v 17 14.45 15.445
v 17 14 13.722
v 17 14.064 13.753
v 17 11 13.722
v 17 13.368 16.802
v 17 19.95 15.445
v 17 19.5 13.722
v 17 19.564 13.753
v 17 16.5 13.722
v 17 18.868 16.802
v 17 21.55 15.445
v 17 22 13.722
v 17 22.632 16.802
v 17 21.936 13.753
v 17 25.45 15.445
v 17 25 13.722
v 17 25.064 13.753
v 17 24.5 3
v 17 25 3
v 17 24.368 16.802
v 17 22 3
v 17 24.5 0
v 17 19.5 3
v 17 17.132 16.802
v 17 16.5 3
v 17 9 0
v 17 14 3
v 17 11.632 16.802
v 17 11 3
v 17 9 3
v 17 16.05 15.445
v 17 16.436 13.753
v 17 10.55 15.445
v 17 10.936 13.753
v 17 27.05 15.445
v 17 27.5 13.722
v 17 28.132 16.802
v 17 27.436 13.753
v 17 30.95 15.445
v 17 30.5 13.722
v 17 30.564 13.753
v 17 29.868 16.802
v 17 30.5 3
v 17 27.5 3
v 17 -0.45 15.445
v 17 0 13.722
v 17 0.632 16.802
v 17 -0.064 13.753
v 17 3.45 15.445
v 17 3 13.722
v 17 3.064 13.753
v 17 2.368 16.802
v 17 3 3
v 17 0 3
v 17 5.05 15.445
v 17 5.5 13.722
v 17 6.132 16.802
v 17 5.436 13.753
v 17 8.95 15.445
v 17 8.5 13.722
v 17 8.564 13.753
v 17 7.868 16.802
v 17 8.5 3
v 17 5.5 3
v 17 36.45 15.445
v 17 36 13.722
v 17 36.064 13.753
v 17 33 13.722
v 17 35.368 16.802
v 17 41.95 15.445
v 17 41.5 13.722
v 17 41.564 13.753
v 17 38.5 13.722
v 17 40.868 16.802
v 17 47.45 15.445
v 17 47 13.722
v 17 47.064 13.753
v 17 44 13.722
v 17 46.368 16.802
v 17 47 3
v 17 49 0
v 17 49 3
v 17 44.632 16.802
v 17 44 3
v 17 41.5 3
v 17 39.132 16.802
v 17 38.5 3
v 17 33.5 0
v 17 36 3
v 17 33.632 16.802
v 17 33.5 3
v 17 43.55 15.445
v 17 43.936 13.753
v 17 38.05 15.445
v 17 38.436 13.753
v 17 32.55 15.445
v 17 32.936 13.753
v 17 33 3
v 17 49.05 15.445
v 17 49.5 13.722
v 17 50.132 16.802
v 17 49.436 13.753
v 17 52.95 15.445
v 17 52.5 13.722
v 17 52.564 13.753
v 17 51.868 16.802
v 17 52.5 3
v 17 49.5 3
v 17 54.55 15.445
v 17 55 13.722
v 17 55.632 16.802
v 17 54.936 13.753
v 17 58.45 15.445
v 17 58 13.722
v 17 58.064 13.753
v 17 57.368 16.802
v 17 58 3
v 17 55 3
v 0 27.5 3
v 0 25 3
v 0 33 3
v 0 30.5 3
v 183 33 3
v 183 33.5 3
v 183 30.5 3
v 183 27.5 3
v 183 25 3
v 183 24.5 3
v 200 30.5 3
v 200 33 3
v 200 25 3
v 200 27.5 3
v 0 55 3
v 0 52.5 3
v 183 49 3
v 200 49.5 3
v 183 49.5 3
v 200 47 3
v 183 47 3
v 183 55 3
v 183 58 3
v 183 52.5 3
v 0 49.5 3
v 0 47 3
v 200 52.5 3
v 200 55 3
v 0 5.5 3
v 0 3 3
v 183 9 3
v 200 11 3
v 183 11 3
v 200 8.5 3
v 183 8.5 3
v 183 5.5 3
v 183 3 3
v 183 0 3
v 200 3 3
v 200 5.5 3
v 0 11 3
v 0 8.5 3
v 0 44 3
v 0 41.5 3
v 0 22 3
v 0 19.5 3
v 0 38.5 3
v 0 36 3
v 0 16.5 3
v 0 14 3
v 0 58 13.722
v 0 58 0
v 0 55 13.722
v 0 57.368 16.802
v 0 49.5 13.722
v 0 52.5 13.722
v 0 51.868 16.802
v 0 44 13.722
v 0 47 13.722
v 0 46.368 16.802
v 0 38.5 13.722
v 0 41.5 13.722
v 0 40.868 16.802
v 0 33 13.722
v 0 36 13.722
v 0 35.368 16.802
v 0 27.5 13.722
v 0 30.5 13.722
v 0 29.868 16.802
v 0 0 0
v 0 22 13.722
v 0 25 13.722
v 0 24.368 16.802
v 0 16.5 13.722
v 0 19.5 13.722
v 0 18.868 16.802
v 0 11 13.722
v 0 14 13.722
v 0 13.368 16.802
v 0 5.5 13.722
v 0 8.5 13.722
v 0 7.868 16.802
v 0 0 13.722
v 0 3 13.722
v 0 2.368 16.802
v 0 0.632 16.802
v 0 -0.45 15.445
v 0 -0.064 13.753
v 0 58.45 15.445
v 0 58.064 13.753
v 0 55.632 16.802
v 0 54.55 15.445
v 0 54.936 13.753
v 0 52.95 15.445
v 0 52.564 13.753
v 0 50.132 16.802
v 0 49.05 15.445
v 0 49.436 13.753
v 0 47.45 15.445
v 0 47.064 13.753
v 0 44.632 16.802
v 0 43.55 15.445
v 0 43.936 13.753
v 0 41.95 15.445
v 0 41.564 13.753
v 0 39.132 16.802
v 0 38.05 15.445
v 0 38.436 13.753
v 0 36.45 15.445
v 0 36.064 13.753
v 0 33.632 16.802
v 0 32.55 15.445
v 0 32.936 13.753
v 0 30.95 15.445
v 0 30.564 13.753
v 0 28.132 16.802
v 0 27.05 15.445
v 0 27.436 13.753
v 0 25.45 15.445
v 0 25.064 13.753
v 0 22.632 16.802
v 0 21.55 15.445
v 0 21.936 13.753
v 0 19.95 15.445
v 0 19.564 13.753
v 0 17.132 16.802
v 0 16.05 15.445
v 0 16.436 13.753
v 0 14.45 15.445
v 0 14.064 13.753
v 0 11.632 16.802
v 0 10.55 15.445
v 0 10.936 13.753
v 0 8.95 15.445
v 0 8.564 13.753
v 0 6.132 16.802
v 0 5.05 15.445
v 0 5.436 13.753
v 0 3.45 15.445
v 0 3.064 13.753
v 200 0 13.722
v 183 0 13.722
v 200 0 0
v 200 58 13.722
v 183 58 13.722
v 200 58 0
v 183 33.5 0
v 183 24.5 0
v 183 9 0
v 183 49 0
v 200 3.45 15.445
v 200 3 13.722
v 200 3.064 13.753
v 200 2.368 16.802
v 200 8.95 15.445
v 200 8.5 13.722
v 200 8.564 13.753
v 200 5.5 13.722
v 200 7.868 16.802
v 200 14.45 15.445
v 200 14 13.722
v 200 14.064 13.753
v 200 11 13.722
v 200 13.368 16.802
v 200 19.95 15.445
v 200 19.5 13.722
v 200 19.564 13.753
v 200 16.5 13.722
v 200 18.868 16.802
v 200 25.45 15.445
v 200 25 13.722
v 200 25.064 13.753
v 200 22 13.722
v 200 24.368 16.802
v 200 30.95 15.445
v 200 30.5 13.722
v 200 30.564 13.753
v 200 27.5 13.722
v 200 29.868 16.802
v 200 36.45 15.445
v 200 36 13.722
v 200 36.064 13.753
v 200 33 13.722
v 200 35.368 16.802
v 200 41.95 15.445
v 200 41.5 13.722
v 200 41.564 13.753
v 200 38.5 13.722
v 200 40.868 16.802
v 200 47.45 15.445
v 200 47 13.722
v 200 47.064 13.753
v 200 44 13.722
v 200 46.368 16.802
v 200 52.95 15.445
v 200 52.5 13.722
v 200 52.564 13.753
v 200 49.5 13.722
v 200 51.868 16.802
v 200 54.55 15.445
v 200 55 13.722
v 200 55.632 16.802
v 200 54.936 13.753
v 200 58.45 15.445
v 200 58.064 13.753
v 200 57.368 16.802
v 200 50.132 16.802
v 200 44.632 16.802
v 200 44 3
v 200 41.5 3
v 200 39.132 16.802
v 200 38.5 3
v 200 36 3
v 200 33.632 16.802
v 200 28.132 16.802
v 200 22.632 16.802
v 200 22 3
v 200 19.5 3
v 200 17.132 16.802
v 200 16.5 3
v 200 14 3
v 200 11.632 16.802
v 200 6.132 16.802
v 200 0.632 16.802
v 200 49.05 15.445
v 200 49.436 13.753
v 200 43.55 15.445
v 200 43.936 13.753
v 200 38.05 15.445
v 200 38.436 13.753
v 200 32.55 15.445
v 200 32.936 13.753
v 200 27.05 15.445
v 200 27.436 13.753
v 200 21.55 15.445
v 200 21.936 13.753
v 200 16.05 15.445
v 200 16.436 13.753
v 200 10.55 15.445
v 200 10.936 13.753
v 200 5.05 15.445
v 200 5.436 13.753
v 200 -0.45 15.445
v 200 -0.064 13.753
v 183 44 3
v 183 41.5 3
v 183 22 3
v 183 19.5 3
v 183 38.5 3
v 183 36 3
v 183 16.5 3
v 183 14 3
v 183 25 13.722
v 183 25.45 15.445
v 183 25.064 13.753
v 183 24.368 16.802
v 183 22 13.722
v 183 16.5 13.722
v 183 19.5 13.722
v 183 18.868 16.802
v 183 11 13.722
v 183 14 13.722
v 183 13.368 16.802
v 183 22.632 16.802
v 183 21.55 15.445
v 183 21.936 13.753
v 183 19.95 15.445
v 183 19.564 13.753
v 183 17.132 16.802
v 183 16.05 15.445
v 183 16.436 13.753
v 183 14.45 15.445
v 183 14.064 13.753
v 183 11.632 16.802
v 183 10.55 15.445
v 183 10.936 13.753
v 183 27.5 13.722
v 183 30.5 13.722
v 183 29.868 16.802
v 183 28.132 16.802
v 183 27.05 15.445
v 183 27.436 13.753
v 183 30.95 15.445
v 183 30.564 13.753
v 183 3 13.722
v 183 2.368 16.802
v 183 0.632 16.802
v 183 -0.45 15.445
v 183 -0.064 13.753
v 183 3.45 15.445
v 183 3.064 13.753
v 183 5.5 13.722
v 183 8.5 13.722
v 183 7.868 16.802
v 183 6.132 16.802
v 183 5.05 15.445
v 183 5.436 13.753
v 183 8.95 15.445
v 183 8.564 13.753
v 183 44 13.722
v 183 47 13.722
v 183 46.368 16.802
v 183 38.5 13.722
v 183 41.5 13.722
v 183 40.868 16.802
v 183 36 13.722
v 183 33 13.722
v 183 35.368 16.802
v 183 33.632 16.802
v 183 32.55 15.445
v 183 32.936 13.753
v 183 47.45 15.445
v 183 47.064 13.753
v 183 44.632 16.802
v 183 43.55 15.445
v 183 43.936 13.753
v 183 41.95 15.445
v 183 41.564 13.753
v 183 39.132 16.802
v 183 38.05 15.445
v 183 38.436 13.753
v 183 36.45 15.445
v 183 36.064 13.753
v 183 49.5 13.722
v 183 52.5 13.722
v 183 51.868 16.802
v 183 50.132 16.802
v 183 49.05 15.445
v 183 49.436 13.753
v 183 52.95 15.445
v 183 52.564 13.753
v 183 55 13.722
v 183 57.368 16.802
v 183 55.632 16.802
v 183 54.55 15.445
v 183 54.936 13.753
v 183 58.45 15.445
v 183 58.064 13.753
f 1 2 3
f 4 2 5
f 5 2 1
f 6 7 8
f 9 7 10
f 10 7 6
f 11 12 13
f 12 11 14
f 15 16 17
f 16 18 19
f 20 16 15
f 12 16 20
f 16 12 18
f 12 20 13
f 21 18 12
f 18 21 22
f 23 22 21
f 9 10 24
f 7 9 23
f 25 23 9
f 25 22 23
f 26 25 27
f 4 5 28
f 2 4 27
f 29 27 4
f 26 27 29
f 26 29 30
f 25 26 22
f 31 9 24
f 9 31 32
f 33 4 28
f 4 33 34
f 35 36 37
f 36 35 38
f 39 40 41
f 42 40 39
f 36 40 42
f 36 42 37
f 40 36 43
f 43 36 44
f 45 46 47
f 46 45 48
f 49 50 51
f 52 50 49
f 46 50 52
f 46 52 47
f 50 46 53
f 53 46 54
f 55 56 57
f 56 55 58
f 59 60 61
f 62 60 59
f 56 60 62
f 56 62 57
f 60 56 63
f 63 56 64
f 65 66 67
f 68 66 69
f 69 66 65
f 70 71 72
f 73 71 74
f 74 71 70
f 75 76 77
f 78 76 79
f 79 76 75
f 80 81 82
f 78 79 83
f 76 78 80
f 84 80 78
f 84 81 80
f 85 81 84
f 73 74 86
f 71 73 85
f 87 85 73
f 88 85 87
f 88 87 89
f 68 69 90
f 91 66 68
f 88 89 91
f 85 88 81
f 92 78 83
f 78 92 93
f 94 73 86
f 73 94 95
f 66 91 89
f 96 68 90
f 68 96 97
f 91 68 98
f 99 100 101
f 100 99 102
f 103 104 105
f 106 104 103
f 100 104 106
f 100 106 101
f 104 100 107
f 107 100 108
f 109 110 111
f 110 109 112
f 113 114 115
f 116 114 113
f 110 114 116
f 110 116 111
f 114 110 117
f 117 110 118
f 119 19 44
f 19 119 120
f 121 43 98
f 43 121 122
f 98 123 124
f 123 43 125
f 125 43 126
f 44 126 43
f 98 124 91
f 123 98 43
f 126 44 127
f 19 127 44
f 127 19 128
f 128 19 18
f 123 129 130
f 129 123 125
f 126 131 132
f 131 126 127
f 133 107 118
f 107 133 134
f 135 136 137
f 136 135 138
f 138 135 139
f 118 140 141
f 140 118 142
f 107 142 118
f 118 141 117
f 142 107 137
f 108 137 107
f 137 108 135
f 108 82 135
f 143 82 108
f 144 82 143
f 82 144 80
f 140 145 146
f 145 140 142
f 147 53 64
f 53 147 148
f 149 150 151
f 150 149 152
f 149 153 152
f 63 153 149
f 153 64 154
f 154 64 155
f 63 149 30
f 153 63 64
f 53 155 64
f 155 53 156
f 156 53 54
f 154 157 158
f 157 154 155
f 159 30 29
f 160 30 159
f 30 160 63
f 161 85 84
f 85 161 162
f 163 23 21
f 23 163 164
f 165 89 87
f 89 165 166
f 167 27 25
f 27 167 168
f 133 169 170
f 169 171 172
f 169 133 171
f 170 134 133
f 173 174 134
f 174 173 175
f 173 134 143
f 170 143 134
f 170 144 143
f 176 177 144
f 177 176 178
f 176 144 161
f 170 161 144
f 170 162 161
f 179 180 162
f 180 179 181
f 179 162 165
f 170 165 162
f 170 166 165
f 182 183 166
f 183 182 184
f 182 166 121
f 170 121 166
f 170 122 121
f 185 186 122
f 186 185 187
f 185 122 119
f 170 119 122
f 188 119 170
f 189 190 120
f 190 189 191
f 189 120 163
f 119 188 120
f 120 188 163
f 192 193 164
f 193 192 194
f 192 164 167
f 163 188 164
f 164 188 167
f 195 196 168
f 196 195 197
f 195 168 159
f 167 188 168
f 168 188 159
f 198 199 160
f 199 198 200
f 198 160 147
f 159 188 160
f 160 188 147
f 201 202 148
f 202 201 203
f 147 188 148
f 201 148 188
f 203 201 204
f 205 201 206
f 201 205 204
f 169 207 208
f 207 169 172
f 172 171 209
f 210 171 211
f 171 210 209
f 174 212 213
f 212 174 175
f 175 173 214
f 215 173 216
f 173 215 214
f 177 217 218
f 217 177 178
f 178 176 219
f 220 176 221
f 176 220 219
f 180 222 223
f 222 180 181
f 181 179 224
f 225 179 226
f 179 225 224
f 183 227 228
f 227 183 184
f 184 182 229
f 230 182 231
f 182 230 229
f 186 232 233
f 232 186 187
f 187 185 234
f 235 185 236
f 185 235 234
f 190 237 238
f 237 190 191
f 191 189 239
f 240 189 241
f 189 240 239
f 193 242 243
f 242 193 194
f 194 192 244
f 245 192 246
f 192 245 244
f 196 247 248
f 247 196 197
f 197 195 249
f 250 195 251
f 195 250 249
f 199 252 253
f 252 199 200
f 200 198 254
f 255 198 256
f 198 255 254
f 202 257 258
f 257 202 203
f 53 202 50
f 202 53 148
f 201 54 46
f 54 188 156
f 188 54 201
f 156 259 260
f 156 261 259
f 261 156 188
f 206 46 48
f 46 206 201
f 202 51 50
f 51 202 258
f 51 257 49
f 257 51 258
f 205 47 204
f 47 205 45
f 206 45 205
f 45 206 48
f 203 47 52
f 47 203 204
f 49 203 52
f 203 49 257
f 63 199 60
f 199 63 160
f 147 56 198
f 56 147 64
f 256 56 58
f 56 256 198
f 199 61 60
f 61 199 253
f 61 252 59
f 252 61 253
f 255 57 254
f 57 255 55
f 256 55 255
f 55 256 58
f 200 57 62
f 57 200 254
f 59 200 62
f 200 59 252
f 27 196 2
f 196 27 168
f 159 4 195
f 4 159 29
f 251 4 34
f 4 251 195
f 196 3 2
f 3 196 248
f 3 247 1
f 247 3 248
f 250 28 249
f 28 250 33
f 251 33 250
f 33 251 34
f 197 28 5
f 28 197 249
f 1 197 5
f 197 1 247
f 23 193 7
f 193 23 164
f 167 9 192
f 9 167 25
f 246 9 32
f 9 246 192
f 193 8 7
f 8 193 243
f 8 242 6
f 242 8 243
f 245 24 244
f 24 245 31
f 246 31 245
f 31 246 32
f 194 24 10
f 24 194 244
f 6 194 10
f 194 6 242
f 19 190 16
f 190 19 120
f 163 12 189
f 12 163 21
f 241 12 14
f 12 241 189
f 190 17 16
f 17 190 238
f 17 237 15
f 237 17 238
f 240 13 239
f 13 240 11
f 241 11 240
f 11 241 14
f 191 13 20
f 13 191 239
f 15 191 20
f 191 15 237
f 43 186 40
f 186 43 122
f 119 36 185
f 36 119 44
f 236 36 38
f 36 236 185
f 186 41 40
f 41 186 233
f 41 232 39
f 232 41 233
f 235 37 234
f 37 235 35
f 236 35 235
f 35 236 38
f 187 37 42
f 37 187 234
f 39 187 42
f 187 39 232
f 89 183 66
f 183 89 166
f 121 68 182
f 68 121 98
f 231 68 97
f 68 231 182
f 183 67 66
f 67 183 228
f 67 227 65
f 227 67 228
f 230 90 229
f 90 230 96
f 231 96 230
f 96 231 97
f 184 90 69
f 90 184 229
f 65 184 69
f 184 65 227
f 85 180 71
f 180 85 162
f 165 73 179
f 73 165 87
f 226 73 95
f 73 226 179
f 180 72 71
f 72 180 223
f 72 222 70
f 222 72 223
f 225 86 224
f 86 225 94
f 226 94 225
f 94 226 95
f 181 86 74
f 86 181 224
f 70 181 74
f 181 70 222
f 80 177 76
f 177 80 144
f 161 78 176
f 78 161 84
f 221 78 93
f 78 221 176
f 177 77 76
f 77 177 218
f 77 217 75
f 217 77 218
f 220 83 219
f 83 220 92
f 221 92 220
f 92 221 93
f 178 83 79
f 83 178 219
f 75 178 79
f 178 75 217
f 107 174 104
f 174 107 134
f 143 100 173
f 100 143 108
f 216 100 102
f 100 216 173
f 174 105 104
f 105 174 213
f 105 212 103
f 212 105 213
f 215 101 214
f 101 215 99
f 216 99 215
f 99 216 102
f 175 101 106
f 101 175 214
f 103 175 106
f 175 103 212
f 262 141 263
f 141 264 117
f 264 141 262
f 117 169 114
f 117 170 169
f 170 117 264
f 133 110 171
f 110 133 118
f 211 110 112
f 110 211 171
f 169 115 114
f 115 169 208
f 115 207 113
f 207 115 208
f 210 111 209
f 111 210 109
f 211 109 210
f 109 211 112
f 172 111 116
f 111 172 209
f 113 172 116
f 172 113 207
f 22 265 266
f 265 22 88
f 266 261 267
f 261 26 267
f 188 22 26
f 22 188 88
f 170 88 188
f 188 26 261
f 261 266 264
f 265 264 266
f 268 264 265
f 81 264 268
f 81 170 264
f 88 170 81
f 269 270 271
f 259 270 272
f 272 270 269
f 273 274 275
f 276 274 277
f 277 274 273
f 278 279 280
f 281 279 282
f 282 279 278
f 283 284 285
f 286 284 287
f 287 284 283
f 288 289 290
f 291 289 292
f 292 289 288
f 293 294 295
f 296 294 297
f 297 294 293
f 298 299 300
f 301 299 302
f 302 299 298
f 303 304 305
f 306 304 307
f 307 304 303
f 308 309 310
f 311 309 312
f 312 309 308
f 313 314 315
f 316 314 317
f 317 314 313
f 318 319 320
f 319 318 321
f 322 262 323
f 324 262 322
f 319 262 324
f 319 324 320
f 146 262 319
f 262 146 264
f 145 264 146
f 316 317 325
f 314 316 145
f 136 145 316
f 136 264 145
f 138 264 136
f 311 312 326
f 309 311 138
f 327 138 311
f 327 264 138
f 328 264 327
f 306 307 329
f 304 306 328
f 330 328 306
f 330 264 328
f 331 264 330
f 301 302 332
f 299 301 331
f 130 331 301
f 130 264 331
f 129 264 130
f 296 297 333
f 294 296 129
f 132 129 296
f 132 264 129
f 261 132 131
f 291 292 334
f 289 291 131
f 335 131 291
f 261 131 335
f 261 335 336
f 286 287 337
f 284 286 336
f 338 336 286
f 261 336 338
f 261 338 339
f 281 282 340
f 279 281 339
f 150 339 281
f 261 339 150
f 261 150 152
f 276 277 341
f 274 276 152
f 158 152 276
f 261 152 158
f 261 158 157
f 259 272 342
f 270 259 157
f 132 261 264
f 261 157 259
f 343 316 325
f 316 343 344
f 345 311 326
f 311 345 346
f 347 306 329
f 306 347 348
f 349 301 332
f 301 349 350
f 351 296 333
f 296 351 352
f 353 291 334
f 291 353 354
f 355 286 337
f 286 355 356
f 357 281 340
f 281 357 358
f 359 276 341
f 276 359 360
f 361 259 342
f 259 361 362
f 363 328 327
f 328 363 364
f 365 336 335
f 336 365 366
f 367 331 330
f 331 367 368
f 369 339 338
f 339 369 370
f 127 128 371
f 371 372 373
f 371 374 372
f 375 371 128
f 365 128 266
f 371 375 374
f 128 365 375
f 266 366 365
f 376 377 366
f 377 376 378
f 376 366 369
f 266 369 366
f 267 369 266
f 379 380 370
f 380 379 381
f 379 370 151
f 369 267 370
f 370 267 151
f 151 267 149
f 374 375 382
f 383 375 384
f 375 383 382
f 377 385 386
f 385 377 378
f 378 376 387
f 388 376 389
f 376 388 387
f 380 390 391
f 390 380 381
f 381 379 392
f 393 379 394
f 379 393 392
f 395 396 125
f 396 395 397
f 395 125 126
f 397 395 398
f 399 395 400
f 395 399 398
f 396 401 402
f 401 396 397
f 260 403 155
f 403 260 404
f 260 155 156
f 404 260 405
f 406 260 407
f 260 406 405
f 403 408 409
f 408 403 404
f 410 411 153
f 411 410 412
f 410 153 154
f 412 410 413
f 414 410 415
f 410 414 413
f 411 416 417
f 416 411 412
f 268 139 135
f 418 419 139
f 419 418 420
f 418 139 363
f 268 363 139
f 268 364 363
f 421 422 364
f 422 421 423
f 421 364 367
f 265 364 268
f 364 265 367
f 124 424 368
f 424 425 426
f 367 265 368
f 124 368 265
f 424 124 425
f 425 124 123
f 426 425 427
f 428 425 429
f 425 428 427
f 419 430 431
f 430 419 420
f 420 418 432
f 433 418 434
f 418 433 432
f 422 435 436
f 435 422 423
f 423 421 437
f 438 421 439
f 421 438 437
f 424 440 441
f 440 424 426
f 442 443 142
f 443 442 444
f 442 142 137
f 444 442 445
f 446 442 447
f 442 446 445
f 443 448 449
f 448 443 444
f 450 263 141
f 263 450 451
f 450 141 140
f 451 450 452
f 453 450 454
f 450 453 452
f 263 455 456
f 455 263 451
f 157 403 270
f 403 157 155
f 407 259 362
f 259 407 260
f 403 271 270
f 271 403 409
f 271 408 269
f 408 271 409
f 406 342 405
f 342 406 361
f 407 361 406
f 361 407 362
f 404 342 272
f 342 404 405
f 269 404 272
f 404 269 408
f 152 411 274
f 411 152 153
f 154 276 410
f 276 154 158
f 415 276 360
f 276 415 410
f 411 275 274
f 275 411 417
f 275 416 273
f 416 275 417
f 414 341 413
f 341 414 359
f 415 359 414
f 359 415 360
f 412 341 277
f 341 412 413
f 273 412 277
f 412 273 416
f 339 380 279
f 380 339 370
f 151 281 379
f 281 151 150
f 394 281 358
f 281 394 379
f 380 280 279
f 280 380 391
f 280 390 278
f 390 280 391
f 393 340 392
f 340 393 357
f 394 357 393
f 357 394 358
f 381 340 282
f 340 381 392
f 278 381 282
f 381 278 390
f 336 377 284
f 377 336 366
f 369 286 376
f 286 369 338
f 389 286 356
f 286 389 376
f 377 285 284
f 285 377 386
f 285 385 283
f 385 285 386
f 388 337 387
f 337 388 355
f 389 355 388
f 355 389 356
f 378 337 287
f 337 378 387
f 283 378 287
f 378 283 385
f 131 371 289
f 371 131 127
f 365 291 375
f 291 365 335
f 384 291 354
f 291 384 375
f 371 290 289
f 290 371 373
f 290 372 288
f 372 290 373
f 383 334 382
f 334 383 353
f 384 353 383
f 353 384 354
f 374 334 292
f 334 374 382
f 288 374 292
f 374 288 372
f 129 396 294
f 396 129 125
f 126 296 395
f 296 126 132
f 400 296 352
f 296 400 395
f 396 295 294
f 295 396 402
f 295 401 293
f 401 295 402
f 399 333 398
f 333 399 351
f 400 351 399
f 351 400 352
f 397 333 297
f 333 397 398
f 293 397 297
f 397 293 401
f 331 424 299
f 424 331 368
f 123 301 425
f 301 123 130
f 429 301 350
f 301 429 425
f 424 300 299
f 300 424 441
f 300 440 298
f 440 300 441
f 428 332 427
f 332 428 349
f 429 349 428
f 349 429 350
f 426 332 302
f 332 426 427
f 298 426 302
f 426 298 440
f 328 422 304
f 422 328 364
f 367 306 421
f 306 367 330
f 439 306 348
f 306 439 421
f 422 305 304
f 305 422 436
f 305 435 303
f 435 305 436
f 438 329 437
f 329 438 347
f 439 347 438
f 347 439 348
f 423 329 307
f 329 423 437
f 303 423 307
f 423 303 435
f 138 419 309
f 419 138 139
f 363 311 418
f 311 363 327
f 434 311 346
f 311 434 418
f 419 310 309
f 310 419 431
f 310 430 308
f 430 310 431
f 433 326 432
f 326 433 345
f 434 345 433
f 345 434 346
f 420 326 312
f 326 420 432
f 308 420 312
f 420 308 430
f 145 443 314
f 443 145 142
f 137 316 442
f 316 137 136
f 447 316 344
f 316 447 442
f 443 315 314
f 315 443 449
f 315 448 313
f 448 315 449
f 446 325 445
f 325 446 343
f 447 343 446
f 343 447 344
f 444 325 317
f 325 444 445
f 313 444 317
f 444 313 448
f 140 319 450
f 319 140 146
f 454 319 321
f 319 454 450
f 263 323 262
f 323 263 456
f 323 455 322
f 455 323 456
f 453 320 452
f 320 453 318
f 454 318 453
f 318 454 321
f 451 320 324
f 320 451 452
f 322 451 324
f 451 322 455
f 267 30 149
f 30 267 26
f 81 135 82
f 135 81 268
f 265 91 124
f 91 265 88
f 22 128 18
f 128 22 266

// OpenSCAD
// Radius of Circle
circleRadius = 2; // [1:0.25:15]

// Width of Post
postWidth = 3; // [0.5:0.5:10]

// Height of Post Before Circle
postHeightBeforeCircle = 10; // [0:0.5:40]

// Width of Base
baseWidth = 3; // [1:0.25:10]

// Width of Gap Between Posts
gap = 2.5; // [1:0.5:15]

// number of posts
numPosts = 11; // [1:1:20]

// depth of holder
depth = 17; // [1:1:50]

// overall length
distance = 200; // [1:30:500]

// width of spacers
spacerWidth = 9; // [1:10:50]

// calculated variables
postHeight = postHeightBeforeCircle + circleRadius;
totalLength = (numPosts * postWidth) + (gap * (numPosts - 1));

// Model Generation
module left() {
	cube ([depth,totalLength,baseWidth]);
	
	for (i = [0 : postWidth + gap : totalLength]){
		translate([0, i, baseWidth]){
			cube([depth, postWidth, postHeight]);
		}
		translate([0, (i+postWidth/2), postHeight+baseWidth]){
			rotate([0, 90, 0]){
				cylinder(h=depth, r=circleRadius);
			}
		}
	}
}

module right(){
    translate([distance-depth,0,0]){
        left();
        };
    }

module complete() {
    left();
    right();
    posThirdSpacer = (numPosts)*(postWidth+gap)-spacerWidth-gap;
    cube ([distance,spacerWidth,baseWidth]);
    translate([0,posThirdSpacer, 0]){
        cube ([distance,spacerWidth,baseWidth]);
        }
    translate([0,posThirdSpacer/2, 0]){
        cube ([distance,spacerWidth,baseWidth]);
        }
    }

complete();
